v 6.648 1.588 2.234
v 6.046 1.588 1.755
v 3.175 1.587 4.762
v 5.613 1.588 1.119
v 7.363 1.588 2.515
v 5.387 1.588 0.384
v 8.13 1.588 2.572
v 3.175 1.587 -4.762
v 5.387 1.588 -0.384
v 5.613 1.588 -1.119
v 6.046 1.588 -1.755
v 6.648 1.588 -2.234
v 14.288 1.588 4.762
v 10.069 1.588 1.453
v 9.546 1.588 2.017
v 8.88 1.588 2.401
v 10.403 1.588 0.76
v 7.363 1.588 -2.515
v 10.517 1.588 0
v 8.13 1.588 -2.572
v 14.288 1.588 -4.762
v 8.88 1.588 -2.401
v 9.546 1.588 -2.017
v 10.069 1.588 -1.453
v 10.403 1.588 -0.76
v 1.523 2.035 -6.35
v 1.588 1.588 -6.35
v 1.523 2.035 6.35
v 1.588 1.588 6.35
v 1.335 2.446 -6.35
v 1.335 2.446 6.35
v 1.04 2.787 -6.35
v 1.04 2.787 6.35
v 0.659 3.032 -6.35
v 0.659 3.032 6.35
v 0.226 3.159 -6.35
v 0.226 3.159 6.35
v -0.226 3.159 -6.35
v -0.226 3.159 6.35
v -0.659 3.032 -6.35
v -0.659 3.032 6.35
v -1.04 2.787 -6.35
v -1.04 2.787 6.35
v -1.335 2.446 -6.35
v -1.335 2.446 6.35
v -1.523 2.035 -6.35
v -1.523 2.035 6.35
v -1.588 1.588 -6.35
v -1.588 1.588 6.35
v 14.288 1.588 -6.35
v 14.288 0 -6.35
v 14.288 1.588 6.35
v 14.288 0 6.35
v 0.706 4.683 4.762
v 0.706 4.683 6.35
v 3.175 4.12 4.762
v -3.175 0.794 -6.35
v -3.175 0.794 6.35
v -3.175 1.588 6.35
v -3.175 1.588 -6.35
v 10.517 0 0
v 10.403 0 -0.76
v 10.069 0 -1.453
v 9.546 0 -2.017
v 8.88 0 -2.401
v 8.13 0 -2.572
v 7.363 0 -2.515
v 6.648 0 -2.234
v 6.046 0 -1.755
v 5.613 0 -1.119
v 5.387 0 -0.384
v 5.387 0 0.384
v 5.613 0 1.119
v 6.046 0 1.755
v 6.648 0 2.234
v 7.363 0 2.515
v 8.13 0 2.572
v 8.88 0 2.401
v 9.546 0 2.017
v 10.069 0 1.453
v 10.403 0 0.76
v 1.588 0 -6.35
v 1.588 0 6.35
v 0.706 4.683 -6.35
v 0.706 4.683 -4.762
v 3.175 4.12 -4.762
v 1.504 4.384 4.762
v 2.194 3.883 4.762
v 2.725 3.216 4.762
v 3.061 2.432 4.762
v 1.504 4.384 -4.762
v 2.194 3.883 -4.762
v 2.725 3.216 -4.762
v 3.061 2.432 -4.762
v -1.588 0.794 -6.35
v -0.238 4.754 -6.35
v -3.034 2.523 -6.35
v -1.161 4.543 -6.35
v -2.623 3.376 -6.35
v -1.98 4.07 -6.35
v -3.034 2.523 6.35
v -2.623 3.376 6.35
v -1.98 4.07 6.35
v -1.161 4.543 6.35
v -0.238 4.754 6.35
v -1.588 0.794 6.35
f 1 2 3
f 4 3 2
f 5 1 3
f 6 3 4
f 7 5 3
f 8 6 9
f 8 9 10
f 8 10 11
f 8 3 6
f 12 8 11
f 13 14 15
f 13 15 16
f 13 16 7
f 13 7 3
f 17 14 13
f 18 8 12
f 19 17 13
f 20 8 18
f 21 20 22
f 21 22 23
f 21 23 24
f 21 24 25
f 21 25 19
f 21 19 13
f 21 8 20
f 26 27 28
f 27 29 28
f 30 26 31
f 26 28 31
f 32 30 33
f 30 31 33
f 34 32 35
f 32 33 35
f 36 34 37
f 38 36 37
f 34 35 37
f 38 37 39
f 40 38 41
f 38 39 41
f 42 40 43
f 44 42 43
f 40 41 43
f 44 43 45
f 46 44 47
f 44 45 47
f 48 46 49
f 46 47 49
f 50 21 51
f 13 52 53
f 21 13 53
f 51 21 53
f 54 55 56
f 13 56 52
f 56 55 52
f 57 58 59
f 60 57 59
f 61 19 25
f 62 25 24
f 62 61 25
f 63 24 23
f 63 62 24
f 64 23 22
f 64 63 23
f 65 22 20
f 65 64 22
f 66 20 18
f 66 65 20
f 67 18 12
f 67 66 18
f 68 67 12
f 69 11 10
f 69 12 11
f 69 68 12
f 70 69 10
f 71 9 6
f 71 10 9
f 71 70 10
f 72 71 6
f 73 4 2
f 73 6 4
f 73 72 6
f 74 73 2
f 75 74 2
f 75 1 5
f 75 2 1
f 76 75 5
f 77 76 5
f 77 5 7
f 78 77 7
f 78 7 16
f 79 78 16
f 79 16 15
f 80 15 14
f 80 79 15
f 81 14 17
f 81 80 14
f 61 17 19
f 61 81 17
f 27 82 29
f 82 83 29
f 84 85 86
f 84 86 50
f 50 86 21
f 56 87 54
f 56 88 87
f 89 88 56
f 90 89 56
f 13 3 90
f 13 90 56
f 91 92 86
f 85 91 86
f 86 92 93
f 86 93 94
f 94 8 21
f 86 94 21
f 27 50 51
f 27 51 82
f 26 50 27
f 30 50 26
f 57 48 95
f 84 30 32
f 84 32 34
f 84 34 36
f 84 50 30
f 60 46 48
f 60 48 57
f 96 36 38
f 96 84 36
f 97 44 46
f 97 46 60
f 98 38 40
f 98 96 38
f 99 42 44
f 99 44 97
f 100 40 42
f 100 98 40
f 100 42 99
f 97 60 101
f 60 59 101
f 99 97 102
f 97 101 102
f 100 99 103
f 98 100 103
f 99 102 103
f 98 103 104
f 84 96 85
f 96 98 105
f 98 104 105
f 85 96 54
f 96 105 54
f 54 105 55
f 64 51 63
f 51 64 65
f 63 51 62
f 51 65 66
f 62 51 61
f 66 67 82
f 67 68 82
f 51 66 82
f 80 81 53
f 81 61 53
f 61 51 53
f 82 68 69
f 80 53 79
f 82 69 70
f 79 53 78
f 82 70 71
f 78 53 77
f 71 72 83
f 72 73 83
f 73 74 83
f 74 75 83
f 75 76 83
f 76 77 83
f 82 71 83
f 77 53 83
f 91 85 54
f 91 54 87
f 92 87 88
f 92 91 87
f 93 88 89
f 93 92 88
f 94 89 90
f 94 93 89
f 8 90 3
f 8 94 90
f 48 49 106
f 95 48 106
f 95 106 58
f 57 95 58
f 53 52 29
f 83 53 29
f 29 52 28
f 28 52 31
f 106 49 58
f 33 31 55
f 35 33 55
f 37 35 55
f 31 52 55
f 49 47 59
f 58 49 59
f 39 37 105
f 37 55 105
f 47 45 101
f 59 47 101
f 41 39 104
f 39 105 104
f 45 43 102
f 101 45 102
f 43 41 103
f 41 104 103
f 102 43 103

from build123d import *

# Parameters (mm, degrees)
BOSS_EXTRUDE1_DEPTH            = 6.35
CUT_EXTRUDE3_START             = 1.5875
SKETCH4_W                      = 11.1125
SKETCH4_H                      = 9.525
CUT_EXTRUDE3_DEPTH             = 4.175
CUT_EXTRUDE4_REACH             = 8.35
CUT_EXTRUDE4_DIRECTION_2_REACH = 8.35
SKETCH3_R                      = 2.579687
CUT_EXTRUDE2_DEPTH             = 2.54


with BuildPart() as part:
    # Sketch1 → Boss-Extrude1 (new body, symmetric)
    with BuildSketch(Plane.XY):
        with BuildLine():
            Line((-3.175, 0.79375), (-3.175, 1.5875))
            ThreePointArc((-3.175, 1.5875), (-1.97996, 4.069512), (0.705556, 4.683112))
            Line((0.705556, 4.683112), (14.2875, 1.5875))
            Line((14.2875, 1.5875), (14.2875, 0))
            Line((14.2875, 0), (1.5875, 0))
            Line((1.5875, 0), (1.5875, 1.5875))
            ThreePointArc((1.5875, 1.5875), (0, 3.175), (-1.5875, 1.5875))
            Line((-1.5875, 1.5875), (-1.5875, 0.79375))
            Line((-1.5875, 0.79375), (-3.175, 0.79375))
        make_face()
    extrude(amount=BOSS_EXTRUDE1_DEPTH, both=True)

    # Sketch4 → Cut-Extrude3 (cut, through all)
    with BuildSketch(Plane(origin=(0, 0, 0), x_dir=(1, 0, 0), z_dir=(0, 1, 0)).offset(CUT_EXTRUDE3_START)):
        with Locations((8.73125, 0)):
            Rectangle(SKETCH4_W, SKETCH4_H)
    extrude(amount=CUT_EXTRUDE3_DEPTH, mode=Mode.SUBTRACT)

    # Cut-Extrude4: up to this face of the body (flat: up to its plane)
    cut_extrude4_end = Plane(part.part.faces().sort_by_distance((6.879167, 2.431758, 4.7625))[0])
    # Sketch5 → Cut-Extrude4 (cut, up to the picked face)
    with BuildSketch(Plane.XY, mode=Mode.PRIVATE) as cut_extrude4_sk1:
        with BuildLine():
            Line((3.175, 1.5875), (3.175, 4.120274))
            Line((3.175, 4.120274), (0.705556, 4.683112))
            ThreePointArc((0.705556, 4.683112), (2.482012, 3.56746), (3.175, 1.5875))
        make_face()
    cut_extrude4_tool1 = split(extrude(cut_extrude4_sk1.sketch, amount=CUT_EXTRUDE4_REACH, mode=Mode.PRIVATE), bisect_by=cut_extrude4_end, keep=Keep.BOTH, mode=Mode.PRIVATE)
    add(cut_extrude4_tool1.solids().sort_by_distance((2.639834, 3.693359, 0))[0], mode=Mode.SUBTRACT)

    # Cut-Extrude4 direction 2: up to this face of the body (flat: up to its plane)
    cut_extrude4_direction_2_end = Plane(part.part.faces().sort_by_distance((6.879167, 2.431758, -4.7625))[0])
    # Sketch5 → Cut-Extrude4 direction 2 (cut, up to the picked face)
    with BuildSketch(Plane.XY, mode=Mode.PRIVATE) as cut_extrude4_direction_2_sk1:
        with BuildLine():
            Line((3.175, 1.5875), (3.175, 4.120274))
            Line((3.175, 4.120274), (0.705556, 4.683112))
            ThreePointArc((0.705556, 4.683112), (2.482012, 3.56746), (3.175, 1.5875))
        make_face()
    cut_extrude4_direction_2_tool1 = split(extrude(cut_extrude4_direction_2_sk1.sketch, amount=-CUT_EXTRUDE4_DIRECTION_2_REACH, mode=Mode.PRIVATE), bisect_by=cut_extrude4_direction_2_end, keep=Keep.BOTH, mode=Mode.PRIVATE)
    add(cut_extrude4_direction_2_tool1.solids().sort_by_distance((2.639834, 3.693359, 0))[0], mode=Mode.SUBTRACT)

    # Sketch3 → Cut-Extrude2 (cut)
    with BuildSketch(Plane(origin=(0, 0, 0), x_dir=(1, 0, 0), z_dir=(0, 1, 0))):
        with Locations((7.9375, 0)):
            Circle(SKETCH3_R)
    extrude(amount=CUT_EXTRUDE2_DEPTH, mode=Mode.SUBTRACT)


solid = part.part
